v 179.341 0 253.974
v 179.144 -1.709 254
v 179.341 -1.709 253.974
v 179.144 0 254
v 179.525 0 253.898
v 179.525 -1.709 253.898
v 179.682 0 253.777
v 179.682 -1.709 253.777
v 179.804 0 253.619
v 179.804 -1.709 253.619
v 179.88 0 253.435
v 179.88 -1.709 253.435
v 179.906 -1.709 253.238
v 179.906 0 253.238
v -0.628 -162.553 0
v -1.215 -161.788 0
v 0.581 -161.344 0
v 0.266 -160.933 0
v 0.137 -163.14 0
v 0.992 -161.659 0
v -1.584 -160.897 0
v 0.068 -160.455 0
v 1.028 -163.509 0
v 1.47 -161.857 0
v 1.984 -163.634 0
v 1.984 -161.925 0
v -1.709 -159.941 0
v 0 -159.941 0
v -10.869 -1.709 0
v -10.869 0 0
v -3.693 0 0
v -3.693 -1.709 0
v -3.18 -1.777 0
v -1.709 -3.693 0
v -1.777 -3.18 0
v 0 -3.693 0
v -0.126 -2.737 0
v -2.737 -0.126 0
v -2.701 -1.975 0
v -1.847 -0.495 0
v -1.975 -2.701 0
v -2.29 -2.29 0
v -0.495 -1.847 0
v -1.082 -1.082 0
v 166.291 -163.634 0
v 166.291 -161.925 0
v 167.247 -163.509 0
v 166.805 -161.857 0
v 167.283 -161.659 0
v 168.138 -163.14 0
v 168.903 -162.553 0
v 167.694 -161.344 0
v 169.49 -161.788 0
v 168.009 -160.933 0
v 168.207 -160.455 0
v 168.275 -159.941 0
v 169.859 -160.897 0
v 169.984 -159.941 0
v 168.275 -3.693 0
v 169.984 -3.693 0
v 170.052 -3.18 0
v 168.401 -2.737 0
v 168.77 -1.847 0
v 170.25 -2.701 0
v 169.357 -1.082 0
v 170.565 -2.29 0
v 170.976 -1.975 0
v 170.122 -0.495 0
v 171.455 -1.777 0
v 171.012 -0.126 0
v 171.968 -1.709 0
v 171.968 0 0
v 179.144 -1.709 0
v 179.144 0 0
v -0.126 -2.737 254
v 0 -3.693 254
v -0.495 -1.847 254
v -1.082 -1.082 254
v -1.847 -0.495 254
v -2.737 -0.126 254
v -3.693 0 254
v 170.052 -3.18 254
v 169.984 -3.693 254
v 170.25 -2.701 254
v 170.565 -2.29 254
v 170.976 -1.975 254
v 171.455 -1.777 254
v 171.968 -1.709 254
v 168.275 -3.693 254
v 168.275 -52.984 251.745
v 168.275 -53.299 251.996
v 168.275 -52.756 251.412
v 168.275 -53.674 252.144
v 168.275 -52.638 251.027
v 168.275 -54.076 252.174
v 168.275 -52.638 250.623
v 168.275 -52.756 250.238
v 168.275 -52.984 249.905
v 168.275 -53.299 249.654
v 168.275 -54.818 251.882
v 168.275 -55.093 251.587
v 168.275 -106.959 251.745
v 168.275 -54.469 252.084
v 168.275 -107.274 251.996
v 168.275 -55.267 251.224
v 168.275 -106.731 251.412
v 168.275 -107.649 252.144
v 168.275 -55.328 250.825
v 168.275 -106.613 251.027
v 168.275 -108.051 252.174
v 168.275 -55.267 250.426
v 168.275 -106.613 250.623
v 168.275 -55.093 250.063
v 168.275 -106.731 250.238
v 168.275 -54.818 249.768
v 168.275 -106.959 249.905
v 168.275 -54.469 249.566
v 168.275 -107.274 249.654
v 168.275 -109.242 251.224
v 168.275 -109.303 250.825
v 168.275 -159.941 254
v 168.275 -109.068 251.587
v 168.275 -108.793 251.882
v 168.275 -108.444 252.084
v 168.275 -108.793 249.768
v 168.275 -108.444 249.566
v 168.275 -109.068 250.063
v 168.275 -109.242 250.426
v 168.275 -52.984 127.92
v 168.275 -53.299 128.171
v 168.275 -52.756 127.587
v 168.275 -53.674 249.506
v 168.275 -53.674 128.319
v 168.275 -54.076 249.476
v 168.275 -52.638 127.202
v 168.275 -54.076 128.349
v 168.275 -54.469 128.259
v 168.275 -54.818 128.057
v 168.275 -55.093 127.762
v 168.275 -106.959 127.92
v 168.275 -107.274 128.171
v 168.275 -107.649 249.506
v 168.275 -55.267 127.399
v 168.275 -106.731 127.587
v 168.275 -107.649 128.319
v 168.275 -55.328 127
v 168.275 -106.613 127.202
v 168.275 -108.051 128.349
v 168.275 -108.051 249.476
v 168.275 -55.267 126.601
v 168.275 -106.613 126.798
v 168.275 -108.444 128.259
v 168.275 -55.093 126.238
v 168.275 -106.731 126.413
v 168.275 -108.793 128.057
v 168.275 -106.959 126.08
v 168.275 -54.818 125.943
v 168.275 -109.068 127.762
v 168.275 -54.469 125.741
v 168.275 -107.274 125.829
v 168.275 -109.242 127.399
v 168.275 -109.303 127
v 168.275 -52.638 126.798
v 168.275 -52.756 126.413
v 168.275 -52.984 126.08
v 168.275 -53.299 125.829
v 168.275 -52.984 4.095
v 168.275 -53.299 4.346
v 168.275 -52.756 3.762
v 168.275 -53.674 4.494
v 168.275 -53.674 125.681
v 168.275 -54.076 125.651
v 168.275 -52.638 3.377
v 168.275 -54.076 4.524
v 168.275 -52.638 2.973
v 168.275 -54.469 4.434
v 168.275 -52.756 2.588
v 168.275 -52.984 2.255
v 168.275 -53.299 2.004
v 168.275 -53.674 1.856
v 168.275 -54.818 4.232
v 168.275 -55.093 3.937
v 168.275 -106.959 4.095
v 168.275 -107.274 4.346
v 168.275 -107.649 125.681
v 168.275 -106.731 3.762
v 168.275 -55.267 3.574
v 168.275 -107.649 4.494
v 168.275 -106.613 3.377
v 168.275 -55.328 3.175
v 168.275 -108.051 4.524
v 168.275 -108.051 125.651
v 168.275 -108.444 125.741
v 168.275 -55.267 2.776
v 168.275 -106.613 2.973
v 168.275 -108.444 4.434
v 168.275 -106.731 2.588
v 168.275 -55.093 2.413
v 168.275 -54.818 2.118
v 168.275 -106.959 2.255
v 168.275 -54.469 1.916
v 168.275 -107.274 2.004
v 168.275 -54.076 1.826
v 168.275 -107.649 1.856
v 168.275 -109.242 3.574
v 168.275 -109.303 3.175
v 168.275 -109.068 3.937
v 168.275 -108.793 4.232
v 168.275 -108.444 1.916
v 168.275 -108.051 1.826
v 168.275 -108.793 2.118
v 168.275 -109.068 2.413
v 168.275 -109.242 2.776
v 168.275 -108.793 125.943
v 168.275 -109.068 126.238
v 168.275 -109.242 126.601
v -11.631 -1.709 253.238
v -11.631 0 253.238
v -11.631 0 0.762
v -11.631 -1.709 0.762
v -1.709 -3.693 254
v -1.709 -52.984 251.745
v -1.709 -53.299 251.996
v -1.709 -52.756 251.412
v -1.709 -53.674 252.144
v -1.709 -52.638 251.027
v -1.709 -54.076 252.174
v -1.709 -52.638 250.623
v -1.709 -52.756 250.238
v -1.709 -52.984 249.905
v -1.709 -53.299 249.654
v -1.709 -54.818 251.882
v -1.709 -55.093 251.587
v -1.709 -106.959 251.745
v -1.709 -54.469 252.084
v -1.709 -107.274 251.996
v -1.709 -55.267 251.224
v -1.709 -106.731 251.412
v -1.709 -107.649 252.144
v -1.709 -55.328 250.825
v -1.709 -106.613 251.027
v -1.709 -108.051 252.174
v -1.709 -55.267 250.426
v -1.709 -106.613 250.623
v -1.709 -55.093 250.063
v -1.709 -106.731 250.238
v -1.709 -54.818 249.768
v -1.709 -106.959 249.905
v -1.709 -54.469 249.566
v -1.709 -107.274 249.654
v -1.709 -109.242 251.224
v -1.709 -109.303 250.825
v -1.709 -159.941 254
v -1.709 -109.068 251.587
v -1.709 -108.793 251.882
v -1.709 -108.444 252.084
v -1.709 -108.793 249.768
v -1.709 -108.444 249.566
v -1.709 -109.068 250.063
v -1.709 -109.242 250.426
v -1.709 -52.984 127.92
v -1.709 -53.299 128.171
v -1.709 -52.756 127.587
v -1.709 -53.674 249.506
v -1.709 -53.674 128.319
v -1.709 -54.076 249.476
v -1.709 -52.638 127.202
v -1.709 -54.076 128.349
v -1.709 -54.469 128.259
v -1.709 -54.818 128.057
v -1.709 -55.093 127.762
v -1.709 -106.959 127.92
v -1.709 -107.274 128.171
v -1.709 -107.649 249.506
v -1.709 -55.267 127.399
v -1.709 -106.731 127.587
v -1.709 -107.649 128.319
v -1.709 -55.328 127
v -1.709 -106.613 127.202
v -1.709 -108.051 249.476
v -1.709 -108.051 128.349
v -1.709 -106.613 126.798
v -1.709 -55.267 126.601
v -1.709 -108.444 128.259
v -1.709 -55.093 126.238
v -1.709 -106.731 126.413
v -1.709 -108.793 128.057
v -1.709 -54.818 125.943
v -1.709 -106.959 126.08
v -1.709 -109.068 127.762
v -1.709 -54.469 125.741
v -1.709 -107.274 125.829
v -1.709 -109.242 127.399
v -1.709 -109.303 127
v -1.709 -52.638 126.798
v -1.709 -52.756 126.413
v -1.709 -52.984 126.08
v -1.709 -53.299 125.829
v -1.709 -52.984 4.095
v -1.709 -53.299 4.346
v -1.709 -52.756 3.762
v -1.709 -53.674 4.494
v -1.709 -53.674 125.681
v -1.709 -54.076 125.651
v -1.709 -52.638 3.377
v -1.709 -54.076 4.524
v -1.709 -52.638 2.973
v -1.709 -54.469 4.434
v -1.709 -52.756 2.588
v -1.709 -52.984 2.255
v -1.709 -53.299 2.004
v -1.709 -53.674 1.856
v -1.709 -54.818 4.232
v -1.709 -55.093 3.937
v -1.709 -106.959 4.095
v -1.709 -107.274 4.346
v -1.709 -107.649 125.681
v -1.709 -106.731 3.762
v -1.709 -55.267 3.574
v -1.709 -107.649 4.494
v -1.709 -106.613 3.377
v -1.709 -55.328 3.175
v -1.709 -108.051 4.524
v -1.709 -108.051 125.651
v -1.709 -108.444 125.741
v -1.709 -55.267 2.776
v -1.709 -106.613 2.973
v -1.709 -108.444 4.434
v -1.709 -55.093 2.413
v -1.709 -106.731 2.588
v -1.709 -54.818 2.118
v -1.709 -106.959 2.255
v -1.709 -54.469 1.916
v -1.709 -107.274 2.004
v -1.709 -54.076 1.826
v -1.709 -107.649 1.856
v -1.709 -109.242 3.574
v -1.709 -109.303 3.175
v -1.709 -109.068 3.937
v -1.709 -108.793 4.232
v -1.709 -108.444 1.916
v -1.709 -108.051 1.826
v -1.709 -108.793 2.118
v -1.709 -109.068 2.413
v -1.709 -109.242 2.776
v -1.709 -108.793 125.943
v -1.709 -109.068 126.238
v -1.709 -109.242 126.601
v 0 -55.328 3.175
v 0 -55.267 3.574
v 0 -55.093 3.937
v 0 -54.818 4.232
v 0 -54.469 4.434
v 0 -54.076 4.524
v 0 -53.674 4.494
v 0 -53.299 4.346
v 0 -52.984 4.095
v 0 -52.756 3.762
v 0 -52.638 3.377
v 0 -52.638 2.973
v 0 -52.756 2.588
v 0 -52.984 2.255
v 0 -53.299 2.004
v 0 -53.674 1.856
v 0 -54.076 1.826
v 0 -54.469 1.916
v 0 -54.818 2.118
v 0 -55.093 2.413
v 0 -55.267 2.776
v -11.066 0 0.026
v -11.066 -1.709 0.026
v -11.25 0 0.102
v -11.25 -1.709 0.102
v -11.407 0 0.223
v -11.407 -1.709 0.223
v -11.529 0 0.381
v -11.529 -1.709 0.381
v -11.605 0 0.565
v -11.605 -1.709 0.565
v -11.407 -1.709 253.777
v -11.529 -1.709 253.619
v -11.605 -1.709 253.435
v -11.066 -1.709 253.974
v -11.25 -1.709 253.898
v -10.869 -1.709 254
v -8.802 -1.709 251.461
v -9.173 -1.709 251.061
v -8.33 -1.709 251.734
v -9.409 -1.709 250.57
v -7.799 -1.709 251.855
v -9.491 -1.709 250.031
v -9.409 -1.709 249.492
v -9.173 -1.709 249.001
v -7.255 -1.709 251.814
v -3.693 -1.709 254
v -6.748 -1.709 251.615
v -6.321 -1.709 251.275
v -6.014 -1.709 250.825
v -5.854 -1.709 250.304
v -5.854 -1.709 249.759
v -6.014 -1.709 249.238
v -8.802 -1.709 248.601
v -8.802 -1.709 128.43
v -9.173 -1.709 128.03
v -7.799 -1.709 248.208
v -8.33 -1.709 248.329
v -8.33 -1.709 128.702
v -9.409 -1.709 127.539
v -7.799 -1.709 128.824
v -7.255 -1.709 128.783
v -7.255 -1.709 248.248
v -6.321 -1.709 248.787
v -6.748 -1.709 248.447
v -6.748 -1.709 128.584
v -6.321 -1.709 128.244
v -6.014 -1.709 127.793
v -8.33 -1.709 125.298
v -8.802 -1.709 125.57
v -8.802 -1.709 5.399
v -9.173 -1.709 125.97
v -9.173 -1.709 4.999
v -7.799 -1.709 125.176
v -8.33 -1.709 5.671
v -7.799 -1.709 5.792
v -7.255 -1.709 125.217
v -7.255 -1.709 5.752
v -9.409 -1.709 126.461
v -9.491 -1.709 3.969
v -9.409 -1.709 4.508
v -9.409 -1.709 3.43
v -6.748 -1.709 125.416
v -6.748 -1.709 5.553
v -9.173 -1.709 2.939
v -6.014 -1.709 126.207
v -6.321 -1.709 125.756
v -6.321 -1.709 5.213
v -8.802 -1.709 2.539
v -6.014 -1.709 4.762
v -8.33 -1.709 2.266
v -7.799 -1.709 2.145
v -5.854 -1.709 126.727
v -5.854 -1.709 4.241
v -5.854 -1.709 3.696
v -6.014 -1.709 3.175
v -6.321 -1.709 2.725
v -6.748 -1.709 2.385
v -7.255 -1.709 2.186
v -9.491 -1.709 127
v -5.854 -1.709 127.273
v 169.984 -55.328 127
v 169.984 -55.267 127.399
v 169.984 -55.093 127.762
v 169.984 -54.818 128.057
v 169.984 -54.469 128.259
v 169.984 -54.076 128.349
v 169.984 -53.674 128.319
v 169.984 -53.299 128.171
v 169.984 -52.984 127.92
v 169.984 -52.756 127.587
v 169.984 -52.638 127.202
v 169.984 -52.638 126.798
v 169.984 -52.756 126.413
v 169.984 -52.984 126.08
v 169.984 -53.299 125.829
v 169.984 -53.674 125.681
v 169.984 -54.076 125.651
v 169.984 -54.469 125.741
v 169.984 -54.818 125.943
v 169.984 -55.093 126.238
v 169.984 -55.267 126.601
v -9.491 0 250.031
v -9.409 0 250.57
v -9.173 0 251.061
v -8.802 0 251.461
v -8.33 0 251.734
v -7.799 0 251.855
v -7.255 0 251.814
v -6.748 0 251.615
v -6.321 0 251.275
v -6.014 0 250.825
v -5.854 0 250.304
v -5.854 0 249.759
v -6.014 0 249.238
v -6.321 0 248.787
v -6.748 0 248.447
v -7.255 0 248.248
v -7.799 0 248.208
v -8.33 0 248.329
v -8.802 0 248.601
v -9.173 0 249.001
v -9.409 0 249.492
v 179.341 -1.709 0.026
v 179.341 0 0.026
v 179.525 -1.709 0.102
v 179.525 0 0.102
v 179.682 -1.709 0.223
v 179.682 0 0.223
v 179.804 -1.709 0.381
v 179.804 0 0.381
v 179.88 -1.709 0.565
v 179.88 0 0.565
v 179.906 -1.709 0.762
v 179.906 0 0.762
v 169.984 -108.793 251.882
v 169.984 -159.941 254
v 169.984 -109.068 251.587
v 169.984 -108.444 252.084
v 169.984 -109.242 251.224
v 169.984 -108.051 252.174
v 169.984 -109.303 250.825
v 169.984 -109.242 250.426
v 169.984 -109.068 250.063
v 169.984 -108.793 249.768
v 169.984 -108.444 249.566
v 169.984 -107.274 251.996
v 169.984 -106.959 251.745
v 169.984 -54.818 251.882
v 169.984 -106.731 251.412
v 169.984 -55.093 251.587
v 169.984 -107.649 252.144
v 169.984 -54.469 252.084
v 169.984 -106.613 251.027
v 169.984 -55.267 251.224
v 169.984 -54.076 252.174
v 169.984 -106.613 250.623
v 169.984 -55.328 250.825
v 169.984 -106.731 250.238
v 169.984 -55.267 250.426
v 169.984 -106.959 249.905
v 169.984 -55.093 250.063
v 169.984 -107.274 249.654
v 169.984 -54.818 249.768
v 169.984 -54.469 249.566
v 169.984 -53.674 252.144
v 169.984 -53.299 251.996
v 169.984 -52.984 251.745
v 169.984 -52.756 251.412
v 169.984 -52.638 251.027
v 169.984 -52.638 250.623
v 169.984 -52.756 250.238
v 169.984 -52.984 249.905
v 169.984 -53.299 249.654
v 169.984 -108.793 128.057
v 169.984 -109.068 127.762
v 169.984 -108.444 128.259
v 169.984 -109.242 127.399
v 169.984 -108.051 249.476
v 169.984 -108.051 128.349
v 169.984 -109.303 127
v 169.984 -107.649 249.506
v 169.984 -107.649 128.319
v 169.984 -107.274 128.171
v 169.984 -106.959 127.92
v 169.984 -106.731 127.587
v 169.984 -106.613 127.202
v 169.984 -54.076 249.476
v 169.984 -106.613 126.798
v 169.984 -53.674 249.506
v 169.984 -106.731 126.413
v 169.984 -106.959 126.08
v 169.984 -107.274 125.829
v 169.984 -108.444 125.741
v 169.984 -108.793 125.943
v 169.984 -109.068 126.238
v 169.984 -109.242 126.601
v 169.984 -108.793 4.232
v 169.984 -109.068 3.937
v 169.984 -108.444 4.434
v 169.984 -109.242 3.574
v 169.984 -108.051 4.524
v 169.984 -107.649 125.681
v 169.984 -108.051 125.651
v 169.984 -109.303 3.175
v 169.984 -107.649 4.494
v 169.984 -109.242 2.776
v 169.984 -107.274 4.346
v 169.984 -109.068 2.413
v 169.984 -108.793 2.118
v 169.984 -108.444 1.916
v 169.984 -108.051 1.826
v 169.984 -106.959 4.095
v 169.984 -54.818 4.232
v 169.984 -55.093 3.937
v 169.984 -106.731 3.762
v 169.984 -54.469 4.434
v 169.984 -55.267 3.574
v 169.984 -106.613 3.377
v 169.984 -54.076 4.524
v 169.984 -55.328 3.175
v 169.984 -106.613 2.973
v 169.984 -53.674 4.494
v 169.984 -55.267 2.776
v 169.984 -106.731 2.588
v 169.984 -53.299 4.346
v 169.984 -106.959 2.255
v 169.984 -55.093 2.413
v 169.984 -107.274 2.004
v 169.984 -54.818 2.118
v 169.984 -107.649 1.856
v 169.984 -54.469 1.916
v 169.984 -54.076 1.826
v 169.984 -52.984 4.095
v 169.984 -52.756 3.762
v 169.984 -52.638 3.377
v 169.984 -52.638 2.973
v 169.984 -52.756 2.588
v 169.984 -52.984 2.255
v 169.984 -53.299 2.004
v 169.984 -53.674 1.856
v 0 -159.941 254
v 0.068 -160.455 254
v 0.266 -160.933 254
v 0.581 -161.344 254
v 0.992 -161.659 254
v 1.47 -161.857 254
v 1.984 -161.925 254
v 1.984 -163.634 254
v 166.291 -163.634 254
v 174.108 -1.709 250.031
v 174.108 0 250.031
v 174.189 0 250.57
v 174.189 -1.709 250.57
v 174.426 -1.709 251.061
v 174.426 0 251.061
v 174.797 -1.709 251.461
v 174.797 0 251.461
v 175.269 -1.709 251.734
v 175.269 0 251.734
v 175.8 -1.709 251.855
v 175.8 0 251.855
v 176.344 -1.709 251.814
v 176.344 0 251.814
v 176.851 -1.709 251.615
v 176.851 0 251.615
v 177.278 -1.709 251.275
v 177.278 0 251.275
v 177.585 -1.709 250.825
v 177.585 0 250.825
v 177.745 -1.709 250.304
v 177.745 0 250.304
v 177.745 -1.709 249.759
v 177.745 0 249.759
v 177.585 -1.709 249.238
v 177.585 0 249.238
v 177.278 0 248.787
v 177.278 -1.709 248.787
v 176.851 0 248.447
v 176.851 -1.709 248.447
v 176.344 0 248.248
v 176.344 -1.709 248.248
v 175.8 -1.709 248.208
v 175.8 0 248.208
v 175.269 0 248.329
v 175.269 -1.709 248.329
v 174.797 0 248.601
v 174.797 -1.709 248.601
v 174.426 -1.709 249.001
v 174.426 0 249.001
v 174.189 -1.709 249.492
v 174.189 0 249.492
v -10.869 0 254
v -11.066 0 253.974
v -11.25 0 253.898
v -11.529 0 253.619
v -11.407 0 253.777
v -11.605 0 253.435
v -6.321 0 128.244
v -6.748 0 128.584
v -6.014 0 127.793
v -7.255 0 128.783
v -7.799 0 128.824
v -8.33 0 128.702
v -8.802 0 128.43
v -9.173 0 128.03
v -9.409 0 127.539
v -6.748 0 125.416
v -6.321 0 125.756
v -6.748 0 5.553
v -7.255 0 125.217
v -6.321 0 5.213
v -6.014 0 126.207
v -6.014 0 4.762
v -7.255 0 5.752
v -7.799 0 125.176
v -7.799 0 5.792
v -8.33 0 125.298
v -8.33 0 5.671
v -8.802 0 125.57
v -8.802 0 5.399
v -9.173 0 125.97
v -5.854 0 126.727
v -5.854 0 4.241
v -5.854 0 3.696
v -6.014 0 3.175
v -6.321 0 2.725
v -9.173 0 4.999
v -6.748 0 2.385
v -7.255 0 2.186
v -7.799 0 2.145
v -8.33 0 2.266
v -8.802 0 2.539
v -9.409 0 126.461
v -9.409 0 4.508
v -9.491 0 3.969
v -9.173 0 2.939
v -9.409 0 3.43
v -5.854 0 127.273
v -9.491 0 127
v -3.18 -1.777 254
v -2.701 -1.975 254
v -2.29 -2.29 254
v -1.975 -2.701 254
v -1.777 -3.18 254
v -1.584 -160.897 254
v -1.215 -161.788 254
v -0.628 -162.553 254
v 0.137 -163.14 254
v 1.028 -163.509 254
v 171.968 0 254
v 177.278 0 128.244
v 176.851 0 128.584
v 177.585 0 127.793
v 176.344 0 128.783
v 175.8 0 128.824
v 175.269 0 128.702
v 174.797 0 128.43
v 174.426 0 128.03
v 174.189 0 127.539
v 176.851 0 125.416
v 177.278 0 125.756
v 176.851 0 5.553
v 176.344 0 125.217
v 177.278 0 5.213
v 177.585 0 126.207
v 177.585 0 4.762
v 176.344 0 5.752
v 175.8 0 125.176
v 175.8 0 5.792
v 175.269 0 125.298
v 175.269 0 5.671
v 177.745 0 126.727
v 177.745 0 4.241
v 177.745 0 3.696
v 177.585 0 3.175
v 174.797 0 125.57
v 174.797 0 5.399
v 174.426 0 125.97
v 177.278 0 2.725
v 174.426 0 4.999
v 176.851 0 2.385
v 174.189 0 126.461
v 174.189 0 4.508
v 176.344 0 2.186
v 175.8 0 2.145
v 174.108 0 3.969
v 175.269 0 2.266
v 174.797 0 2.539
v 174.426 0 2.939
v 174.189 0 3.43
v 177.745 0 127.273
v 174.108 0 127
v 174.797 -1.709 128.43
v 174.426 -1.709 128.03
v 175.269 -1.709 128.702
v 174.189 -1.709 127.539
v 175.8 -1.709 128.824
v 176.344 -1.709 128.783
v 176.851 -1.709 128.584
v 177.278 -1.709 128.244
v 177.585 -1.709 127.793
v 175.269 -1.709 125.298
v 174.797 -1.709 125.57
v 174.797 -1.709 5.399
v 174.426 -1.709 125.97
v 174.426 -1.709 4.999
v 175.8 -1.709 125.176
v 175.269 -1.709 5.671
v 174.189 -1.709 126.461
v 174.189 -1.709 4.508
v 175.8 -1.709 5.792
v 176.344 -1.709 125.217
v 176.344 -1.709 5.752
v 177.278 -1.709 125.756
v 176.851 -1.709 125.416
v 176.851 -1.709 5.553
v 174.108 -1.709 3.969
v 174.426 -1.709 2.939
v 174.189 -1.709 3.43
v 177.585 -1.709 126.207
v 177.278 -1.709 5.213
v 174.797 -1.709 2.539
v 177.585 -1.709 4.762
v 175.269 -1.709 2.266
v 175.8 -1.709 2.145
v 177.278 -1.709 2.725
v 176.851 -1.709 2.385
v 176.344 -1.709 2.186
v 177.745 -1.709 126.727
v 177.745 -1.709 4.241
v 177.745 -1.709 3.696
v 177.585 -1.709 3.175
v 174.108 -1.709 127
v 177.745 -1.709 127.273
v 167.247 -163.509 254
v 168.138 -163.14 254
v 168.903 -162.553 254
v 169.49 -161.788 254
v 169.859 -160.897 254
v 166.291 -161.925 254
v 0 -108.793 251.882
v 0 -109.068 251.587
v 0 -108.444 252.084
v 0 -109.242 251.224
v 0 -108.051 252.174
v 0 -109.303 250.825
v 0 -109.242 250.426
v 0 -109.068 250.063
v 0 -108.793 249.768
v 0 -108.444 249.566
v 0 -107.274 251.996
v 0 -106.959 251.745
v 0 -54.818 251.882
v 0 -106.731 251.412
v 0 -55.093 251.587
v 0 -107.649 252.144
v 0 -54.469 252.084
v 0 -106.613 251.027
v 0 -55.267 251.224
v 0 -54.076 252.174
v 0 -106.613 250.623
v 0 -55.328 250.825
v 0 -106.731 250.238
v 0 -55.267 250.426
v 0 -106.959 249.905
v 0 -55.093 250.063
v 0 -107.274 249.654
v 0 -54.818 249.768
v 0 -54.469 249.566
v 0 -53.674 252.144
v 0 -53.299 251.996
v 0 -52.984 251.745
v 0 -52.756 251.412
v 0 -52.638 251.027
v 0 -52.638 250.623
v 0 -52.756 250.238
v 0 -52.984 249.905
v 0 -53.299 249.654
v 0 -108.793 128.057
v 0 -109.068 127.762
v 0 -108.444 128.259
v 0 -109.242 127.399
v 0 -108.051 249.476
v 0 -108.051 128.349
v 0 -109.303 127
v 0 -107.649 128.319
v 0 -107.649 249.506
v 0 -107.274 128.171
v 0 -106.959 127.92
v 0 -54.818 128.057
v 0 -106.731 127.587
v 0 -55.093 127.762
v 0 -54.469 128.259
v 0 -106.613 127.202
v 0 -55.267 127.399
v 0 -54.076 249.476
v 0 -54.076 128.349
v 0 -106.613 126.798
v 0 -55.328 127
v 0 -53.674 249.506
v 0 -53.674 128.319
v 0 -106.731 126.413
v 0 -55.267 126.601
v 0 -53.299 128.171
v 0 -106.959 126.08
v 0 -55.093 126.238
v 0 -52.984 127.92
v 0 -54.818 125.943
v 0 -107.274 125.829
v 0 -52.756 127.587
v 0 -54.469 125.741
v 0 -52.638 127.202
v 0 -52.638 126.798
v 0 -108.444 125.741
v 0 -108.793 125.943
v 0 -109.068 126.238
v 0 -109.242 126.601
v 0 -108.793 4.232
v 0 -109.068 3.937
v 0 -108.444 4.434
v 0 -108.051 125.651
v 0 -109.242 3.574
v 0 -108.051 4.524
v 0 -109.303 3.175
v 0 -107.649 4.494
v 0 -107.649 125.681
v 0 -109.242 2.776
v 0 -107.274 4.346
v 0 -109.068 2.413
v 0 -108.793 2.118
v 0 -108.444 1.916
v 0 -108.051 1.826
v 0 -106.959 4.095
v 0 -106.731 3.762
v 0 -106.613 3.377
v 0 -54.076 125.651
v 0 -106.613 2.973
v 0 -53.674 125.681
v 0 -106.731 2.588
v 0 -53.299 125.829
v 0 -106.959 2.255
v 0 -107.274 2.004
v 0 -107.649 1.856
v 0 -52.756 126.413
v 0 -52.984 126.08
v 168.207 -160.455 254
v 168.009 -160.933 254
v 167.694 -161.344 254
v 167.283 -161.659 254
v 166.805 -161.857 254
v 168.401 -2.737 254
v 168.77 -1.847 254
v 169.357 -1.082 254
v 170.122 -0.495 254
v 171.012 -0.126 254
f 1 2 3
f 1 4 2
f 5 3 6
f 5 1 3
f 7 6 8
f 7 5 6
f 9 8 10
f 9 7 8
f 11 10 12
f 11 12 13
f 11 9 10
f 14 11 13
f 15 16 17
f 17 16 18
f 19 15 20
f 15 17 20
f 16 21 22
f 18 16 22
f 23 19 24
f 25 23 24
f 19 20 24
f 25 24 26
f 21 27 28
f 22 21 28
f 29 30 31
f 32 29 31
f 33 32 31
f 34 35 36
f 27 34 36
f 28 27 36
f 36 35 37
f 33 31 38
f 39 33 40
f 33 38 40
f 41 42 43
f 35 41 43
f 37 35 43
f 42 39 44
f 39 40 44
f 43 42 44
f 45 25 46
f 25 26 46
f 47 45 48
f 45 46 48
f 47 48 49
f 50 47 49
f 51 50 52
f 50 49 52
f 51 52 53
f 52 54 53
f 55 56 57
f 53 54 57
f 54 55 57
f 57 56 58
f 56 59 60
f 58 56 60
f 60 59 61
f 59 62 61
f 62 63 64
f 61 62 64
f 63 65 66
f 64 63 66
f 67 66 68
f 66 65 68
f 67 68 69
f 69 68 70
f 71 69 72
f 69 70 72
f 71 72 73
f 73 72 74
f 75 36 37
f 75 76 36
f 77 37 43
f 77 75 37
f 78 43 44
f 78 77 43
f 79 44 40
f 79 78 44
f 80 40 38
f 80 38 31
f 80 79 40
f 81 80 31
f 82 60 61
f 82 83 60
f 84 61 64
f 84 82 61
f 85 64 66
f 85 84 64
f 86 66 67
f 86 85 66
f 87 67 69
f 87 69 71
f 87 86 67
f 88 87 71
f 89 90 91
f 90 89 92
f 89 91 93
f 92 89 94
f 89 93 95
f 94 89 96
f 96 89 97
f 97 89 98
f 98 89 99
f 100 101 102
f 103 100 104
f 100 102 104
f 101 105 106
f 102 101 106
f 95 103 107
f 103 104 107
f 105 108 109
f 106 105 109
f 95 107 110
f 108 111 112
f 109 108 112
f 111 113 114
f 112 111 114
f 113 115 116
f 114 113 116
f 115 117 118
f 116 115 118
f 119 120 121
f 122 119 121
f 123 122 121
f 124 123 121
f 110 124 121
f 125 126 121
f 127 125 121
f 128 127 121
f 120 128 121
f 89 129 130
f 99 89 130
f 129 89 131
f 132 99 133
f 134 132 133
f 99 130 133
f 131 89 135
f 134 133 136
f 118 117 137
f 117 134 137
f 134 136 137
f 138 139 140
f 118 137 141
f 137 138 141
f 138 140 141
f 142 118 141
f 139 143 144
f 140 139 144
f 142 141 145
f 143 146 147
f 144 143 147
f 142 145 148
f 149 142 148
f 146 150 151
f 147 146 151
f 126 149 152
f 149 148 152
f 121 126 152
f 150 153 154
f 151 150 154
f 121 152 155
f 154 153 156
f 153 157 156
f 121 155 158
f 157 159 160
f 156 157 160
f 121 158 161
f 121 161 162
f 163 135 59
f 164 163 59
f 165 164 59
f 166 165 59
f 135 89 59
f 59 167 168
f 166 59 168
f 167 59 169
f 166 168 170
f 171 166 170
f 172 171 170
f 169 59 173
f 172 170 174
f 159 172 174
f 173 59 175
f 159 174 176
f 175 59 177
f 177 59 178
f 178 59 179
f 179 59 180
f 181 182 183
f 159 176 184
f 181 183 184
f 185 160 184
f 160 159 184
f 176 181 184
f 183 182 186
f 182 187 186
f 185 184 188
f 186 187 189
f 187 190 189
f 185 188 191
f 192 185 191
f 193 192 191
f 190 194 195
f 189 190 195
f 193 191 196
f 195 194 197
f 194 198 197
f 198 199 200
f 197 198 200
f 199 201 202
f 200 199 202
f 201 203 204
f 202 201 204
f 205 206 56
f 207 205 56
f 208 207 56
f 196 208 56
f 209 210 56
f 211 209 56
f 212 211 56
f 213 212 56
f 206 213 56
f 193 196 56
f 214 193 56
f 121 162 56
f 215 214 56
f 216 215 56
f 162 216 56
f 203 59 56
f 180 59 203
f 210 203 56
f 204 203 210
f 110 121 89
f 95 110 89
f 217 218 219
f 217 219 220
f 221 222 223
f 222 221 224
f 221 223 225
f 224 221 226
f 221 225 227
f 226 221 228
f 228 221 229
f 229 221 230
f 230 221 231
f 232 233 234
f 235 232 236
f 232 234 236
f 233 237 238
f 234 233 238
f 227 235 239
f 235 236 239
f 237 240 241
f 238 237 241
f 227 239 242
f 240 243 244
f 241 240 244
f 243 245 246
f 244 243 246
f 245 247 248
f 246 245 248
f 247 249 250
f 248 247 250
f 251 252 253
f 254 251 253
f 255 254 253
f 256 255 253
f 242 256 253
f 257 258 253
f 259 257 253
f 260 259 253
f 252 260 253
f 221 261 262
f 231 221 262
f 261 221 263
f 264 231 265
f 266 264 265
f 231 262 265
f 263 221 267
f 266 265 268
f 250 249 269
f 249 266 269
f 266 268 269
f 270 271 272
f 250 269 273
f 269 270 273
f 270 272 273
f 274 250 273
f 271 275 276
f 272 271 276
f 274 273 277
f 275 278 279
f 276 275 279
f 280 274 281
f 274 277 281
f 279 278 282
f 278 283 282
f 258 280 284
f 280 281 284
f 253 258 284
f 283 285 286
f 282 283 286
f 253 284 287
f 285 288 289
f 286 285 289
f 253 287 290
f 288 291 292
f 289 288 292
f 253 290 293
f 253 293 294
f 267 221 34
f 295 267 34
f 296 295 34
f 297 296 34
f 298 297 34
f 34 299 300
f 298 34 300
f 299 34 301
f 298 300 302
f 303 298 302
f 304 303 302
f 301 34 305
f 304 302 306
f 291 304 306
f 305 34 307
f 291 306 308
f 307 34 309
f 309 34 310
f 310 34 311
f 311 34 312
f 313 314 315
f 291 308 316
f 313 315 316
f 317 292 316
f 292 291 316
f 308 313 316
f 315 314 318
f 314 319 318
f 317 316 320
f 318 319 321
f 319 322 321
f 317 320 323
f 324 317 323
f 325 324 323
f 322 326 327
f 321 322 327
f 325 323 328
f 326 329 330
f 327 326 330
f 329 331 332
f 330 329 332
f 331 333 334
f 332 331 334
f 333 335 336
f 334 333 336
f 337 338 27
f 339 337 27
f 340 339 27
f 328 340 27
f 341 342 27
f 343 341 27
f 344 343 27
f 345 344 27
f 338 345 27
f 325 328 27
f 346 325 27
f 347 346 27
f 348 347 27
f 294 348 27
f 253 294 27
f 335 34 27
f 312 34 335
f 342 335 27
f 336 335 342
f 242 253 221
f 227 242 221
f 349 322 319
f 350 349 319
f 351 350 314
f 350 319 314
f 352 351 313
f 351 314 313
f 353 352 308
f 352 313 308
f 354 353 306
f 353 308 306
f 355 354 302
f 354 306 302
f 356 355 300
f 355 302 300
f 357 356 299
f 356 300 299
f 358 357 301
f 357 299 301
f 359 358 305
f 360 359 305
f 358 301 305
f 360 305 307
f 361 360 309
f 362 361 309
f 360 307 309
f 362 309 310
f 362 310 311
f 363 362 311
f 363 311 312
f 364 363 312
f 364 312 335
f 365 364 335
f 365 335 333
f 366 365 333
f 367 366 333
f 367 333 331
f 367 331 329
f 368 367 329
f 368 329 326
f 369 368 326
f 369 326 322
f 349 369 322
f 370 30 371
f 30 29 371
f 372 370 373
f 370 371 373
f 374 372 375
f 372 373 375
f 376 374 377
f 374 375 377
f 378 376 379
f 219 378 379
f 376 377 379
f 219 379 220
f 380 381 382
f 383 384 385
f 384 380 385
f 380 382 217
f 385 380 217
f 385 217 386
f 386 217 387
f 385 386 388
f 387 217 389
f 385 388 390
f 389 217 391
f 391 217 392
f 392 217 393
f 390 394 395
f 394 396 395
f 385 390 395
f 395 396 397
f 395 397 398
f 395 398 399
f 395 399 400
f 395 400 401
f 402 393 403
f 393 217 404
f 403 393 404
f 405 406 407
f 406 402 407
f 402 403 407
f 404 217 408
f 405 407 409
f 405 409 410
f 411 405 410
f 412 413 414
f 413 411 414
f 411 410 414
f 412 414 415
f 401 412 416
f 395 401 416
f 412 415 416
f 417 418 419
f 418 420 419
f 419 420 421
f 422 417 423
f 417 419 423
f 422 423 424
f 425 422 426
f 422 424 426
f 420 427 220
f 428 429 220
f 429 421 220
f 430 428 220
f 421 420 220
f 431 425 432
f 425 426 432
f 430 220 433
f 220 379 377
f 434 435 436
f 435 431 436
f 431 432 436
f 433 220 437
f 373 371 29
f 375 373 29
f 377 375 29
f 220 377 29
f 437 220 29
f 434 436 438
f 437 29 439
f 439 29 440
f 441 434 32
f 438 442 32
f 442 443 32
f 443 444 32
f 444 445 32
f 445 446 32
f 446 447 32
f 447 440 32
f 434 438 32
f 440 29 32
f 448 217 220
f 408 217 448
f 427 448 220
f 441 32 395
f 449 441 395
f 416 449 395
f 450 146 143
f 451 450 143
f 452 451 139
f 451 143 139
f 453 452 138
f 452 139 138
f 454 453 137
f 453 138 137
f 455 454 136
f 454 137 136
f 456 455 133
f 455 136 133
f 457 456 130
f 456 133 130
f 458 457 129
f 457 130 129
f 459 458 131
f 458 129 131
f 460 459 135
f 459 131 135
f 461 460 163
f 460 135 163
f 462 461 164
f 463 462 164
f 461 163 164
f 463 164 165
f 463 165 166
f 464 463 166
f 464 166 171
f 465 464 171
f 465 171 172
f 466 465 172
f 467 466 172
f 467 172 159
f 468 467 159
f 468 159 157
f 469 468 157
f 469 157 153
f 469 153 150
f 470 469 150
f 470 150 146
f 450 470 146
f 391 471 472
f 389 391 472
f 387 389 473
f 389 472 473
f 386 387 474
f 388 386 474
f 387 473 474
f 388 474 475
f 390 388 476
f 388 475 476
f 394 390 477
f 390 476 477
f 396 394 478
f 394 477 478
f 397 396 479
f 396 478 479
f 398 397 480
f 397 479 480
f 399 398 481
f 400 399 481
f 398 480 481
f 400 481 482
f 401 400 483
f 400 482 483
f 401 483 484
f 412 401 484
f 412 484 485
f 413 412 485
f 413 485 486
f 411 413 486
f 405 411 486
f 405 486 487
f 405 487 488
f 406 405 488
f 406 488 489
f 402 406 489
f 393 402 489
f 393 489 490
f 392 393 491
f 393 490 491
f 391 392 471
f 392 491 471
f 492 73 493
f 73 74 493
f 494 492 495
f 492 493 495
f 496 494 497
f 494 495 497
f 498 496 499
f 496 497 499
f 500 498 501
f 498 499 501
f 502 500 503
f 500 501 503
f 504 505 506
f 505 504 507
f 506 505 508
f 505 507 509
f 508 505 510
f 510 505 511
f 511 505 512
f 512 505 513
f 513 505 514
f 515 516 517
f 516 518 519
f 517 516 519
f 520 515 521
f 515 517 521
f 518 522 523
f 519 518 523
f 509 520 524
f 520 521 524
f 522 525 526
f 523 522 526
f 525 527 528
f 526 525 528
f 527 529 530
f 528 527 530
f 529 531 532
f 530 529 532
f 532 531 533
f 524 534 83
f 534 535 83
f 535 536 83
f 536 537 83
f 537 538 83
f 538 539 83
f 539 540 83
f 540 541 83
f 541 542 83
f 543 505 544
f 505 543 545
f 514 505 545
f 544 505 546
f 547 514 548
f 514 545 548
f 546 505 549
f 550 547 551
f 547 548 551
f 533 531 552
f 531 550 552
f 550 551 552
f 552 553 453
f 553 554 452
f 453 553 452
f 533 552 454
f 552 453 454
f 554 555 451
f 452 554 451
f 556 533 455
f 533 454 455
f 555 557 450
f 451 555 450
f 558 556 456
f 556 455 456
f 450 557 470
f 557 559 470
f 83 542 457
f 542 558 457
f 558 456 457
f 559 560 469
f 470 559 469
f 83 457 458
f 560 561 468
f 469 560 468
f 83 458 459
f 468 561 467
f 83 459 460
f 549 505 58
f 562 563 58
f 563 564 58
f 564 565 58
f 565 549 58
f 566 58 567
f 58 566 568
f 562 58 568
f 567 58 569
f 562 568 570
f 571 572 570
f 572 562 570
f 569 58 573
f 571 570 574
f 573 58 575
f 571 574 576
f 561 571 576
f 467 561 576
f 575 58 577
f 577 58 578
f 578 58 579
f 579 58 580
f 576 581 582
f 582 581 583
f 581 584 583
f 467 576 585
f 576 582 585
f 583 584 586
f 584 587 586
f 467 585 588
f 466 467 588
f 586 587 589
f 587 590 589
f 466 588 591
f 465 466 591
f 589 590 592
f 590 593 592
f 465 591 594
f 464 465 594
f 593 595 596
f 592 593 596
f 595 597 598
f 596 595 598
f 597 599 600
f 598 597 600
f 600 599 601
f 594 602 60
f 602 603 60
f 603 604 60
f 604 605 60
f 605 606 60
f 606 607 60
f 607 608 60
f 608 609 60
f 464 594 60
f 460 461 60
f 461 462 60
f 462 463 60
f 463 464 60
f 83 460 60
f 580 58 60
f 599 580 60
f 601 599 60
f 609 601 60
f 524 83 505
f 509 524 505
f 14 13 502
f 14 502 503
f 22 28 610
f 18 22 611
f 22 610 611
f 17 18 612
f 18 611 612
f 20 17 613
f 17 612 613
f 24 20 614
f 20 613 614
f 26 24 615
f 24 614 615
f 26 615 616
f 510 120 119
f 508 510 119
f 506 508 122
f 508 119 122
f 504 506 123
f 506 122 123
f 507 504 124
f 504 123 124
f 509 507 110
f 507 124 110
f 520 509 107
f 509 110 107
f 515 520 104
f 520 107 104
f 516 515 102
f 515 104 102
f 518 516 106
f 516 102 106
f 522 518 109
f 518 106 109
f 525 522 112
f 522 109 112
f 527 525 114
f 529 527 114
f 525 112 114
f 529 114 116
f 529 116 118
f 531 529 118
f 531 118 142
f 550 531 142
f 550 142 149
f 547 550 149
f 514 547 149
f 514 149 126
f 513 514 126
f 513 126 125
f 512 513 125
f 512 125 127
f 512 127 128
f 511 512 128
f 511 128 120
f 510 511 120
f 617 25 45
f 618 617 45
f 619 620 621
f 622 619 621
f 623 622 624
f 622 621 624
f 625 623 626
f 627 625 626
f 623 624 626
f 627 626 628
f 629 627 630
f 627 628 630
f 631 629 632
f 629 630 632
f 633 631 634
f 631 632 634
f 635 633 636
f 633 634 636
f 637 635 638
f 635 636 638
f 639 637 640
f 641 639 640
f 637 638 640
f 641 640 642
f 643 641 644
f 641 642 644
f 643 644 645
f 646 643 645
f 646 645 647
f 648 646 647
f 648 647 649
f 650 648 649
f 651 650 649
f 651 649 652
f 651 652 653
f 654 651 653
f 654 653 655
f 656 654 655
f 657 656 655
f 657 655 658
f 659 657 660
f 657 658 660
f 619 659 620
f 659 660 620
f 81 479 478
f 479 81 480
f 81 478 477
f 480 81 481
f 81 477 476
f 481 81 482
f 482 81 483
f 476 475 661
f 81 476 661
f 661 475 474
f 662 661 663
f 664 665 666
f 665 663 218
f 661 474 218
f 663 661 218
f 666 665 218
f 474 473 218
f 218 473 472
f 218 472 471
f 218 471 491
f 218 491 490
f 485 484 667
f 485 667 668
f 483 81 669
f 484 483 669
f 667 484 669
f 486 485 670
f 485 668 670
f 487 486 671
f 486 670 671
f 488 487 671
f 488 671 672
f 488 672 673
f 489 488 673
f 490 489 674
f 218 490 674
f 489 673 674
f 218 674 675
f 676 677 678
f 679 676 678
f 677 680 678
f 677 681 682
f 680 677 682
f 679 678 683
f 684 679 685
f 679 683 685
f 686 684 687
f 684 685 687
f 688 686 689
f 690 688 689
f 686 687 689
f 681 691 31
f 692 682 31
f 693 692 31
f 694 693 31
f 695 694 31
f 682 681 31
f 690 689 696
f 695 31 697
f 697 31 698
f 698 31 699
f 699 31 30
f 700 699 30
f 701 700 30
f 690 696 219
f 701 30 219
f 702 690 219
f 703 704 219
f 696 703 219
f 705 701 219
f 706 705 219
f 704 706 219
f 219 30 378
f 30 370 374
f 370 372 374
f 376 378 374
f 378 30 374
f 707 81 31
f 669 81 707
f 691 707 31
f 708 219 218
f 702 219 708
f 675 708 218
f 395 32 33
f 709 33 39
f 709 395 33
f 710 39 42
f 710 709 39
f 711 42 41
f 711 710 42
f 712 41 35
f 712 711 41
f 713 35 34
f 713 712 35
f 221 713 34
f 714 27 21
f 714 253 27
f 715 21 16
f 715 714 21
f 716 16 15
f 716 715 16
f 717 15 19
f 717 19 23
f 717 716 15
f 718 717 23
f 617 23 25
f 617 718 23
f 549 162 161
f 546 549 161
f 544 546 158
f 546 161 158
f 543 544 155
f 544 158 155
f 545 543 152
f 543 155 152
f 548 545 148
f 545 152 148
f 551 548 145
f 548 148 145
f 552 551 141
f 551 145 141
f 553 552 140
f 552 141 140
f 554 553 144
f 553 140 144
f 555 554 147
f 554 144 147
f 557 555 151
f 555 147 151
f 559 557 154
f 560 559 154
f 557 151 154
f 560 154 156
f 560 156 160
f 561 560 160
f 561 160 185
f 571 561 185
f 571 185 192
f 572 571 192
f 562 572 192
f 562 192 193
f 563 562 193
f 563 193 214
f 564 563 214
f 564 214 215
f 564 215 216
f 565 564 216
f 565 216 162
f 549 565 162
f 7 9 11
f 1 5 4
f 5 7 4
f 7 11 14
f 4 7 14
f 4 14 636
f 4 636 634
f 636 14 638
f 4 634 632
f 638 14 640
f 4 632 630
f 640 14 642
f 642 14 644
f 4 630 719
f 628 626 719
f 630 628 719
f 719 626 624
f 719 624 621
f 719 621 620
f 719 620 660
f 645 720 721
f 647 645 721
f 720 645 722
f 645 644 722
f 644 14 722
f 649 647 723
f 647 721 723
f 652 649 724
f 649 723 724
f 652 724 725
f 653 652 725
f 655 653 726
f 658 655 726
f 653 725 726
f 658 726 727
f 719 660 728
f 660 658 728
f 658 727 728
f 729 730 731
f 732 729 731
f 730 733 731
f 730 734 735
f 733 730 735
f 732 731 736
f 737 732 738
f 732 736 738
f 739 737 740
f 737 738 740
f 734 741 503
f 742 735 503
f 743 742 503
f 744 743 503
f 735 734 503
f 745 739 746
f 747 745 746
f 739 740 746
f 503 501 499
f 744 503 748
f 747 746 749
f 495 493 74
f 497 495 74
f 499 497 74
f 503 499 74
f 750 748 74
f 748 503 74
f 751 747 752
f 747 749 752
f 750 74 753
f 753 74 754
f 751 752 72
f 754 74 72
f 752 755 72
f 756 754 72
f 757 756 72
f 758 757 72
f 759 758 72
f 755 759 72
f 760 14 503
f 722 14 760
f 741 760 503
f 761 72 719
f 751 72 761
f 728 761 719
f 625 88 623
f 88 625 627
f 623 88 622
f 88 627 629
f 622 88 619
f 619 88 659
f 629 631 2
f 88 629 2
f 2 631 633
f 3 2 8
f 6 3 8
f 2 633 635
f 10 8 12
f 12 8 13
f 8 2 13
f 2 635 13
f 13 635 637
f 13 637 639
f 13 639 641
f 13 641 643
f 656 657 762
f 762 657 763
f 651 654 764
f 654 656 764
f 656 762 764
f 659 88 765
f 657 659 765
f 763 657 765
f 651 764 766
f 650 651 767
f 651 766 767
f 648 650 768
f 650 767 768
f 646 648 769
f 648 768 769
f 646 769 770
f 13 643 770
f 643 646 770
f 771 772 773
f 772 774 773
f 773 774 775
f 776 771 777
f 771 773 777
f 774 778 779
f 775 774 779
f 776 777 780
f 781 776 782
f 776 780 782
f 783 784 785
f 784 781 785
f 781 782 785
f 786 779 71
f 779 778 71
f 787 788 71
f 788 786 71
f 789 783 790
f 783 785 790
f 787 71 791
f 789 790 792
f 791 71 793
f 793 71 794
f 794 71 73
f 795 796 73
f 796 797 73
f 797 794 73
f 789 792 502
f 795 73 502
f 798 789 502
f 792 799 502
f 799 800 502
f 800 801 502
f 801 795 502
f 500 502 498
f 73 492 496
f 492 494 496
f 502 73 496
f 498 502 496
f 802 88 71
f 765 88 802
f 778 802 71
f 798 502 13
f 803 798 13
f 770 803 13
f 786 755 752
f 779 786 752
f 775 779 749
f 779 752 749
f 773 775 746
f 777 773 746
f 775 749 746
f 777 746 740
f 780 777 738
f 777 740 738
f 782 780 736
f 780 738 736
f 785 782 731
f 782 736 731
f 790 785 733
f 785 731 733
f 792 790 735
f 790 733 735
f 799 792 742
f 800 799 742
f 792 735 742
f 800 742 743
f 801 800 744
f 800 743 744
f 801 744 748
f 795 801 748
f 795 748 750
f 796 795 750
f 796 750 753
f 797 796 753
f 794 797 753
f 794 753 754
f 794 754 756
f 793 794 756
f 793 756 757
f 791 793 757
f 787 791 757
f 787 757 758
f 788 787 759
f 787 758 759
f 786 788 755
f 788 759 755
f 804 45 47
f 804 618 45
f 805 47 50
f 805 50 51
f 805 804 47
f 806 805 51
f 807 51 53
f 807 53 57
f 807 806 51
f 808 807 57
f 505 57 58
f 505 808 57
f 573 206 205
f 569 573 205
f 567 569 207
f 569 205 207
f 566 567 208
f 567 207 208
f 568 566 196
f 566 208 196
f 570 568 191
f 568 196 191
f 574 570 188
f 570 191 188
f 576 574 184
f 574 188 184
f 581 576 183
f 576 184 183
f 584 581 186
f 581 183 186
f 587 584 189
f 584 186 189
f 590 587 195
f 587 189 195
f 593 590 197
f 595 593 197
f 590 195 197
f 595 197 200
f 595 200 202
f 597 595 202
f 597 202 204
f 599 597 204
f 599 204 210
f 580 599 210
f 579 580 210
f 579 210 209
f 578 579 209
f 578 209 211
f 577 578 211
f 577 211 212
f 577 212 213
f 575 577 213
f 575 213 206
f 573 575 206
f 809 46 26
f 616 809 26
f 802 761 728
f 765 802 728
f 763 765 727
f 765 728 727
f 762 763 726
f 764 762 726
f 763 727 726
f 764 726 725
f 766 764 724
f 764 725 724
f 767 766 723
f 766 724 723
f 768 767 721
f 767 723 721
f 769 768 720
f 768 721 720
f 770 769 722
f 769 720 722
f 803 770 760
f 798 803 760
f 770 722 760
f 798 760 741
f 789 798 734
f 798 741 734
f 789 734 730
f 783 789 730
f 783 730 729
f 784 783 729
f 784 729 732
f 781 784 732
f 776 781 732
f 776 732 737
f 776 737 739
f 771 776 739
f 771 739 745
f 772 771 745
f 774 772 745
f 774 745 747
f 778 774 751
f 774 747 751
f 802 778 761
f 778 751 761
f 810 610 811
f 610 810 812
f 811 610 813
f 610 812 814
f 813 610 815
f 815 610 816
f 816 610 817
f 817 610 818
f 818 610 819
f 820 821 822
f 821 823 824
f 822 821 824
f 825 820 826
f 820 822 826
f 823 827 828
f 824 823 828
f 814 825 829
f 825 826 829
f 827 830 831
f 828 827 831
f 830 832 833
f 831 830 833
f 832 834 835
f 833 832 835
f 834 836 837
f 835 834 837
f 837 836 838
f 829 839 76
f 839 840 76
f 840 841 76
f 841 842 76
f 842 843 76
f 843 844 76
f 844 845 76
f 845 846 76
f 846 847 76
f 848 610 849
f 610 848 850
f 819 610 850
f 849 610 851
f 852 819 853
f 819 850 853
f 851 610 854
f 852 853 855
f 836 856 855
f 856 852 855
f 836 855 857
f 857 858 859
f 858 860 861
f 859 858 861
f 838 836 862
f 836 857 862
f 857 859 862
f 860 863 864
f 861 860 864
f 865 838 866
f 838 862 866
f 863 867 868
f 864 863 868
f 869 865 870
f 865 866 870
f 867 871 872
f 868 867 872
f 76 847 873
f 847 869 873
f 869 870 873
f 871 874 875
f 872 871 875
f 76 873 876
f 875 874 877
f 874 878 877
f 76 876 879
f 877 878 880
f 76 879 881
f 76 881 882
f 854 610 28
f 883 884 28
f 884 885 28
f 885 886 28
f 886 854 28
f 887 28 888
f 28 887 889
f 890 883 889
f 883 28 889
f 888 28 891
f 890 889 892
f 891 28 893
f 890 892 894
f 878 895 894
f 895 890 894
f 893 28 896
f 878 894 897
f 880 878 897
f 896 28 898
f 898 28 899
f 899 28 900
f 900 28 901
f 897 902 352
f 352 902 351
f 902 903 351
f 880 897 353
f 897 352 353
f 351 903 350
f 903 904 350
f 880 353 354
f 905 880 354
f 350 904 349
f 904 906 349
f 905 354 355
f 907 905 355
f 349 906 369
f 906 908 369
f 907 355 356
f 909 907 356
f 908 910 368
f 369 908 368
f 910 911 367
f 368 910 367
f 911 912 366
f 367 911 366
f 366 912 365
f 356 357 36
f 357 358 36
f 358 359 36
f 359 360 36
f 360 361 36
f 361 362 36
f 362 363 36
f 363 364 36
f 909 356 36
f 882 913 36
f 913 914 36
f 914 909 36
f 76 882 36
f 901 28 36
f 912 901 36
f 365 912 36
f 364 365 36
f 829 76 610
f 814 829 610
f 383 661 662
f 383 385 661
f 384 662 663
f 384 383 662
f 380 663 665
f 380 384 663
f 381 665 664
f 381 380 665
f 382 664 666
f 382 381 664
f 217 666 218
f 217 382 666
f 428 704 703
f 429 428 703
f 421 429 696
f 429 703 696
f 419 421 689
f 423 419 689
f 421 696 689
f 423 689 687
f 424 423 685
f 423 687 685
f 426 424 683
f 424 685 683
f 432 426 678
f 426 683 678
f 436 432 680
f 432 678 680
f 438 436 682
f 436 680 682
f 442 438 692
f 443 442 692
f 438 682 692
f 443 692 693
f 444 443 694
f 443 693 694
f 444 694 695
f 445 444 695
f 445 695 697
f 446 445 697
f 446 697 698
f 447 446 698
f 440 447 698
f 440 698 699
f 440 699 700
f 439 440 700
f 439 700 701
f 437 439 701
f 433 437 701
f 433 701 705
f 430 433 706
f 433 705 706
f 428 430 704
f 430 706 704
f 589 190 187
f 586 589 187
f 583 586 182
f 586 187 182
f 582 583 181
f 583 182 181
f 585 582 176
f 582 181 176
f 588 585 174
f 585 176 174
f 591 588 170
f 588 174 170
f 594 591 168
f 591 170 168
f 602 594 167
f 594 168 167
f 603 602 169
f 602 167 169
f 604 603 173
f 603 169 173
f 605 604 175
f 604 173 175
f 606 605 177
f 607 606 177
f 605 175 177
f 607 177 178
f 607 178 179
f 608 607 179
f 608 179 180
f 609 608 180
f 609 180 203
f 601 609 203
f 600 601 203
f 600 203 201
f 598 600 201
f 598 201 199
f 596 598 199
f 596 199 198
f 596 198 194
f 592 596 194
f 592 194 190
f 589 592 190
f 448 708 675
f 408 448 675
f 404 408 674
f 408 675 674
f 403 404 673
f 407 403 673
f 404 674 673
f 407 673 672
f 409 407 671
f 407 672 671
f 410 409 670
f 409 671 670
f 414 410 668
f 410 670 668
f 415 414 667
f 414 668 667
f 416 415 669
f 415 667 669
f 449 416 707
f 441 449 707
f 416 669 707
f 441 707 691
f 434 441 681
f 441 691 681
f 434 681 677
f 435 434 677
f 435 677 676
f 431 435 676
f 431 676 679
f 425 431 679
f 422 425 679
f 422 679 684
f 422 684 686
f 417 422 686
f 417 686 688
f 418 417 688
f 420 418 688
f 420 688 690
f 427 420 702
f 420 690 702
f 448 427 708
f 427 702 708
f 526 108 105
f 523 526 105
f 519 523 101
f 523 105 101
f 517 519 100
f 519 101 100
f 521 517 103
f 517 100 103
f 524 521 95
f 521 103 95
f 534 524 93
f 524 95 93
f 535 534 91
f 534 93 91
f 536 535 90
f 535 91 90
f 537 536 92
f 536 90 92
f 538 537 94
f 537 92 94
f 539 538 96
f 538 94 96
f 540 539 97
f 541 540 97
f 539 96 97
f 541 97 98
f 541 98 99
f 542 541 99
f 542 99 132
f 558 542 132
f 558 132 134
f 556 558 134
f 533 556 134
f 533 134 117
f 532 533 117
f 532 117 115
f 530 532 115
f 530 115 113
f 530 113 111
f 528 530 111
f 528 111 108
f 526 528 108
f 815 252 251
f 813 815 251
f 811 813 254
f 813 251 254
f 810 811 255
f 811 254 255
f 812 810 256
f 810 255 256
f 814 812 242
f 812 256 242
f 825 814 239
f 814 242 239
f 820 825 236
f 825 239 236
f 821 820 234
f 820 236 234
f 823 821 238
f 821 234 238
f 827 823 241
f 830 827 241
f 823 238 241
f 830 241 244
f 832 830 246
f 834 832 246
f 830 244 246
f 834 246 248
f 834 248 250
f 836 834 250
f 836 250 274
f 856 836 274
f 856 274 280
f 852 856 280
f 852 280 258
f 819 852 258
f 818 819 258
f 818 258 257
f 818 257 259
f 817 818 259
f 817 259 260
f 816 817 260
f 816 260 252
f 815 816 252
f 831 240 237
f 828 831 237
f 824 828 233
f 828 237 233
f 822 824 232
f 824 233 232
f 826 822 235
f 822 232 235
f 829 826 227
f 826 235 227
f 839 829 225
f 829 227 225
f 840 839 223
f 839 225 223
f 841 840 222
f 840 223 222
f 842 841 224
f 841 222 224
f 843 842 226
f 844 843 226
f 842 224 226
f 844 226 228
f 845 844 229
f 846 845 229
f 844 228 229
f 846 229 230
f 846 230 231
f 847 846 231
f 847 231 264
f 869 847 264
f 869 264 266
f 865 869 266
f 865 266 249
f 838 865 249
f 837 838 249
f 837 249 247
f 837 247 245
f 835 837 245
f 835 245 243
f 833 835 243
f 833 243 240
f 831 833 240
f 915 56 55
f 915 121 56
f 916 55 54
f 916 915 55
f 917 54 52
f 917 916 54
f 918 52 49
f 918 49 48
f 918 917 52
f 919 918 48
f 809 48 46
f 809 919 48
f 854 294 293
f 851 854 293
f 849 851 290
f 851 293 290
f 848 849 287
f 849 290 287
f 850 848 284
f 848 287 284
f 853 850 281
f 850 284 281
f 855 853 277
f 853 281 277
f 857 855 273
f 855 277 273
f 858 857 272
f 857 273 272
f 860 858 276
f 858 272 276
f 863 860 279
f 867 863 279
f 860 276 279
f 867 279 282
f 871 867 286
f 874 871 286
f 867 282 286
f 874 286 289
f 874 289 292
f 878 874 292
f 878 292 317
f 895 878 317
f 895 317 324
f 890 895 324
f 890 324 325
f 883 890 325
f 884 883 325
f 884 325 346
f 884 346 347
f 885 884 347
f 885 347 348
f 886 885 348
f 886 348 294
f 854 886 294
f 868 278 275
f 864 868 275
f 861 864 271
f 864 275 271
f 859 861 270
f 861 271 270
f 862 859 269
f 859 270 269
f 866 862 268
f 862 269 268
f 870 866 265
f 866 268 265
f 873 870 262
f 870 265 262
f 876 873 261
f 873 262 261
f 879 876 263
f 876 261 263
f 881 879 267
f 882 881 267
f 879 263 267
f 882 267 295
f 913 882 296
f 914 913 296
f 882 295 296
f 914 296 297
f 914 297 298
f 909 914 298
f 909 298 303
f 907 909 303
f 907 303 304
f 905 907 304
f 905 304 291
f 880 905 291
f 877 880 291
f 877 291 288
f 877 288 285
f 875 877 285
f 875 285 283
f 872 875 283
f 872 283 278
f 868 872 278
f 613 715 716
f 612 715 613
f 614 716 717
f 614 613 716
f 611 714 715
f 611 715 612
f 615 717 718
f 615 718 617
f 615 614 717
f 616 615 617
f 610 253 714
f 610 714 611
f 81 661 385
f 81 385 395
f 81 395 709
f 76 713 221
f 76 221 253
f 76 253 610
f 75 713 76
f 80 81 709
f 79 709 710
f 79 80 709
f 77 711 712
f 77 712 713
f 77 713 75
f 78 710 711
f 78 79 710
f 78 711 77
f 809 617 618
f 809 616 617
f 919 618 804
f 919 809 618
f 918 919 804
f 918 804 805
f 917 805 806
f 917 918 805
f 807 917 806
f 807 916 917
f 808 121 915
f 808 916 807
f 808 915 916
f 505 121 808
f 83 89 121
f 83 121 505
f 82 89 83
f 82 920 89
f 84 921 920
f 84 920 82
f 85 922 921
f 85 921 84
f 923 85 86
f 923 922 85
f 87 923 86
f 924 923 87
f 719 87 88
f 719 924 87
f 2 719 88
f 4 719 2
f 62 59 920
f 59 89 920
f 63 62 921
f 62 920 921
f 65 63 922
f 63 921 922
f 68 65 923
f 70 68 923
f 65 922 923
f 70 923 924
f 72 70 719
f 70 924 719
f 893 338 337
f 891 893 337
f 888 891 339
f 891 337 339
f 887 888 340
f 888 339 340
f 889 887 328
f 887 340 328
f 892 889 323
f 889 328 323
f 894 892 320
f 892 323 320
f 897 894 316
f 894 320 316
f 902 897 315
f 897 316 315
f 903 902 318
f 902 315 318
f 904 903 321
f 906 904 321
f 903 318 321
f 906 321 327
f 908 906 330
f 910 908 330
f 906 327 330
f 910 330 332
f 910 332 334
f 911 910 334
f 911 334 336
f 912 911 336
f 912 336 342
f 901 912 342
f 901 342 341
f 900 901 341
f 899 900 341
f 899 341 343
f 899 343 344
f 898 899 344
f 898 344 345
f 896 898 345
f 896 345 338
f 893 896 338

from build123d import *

# Parameters (mm, degrees)
F1_DEPTH = 254
F2_R     = 1.98374
F3_R     = 3.69316
F4_R     = 1.35255
F5_DEPTH = 171.69384
F6_R     = 1.8288
F7_DEPTH = 1.70942
F8_R     = 0.762


with BuildPart() as f1:
    # F0 (on Top) → F1 (new body)
    with BuildSketch(Plane.XY):
        Polygon((0, -161.925), (0, 0), (-11.63066, 0), (-11.63066, -1.70942), (-1.70942, -1.70942), (-1.70942, -163.63442), (169.98442, -163.63442), (169.98442, -1.70942), (179.90566, -1.70942), (179.90566, 0), (168.275, 0), (168.275, -161.925), align=None)
    extrude(amount=F1_DEPTH)

    # F2
    f2_edges = [f1.edges().sort_by_distance(p)[0] for p in [
        (168.275, -161.925, 127),
        (0, -161.925, 127),
        (-1.70942, -1.70942, 127),
        (169.98442, -1.70942, 127),
    ]]
    fillet(f2_edges, radius=F2_R)

    # F3
    f3_edges = [f1.edges().sort_by_distance(p)[0] for p in [
        (0, 0, 127),
        (-1.70942, -163.63442, 127),
        (169.98442, -163.63442, 127),
        (168.275, 0, 127),
    ]]
    fillet(f3_edges, radius=F3_R)

    # F4 (on face) → F5 (cut, through all)
    with BuildSketch(Plane(origin=(-1.70942, 0, 0), x_dir=(0, -1, 0), z_dir=(-1, 0, 0))):
        with Locations((107.95, 3.175)):
            Circle(F4_R)
        with Locations((53.975, 3.175)):
            Circle(F4_R)
        with Locations((53.975, 250.825)):
            Circle(F4_R)
        with Locations((107.95, 250.825)):
            Circle(F4_R)
        with Locations((107.95, 127)):
            Circle(F4_R)
        with Locations((53.975, 127)):
            Circle(F4_R)
    extrude(amount=-F5_DEPTH, mode=Mode.SUBTRACT)

    # F6 (on face) → F7 (cut, through all)
    with BuildSketch(Plane(origin=(0, 0, 0), x_dir=(-1, 0, 0), z_dir=(0, 1, 0))):
        with Locations((-175.93691, 250.03125)):
            Circle(F6_R)
        with Locations((-175.93691, 127)):
            Circle(F6_R)
        with Locations((-175.93691, 3.96875)):
            Circle(F6_R)
        with Locations((7.66191, 3.96875)):
            Circle(F6_R)
        with Locations((7.66191, 127)):
            Circle(F6_R)
        with Locations((7.66191, 250.03125)):
            Circle(F6_R)
    extrude(amount=-F7_DEPTH, mode=Mode.SUBTRACT)

    # F8
    f8_edges = [f1.edges().sort_by_distance(p)[0] for p in [
        (-11.63066, -0.85471, 0),
        (-11.63066, -0.85471, 254),
        (179.90566, -0.85471, 254),
        (179.90566, -0.85471, 0),
    ]]
    fillet(f8_edges, radius=F8_R)


solid = f1.part
